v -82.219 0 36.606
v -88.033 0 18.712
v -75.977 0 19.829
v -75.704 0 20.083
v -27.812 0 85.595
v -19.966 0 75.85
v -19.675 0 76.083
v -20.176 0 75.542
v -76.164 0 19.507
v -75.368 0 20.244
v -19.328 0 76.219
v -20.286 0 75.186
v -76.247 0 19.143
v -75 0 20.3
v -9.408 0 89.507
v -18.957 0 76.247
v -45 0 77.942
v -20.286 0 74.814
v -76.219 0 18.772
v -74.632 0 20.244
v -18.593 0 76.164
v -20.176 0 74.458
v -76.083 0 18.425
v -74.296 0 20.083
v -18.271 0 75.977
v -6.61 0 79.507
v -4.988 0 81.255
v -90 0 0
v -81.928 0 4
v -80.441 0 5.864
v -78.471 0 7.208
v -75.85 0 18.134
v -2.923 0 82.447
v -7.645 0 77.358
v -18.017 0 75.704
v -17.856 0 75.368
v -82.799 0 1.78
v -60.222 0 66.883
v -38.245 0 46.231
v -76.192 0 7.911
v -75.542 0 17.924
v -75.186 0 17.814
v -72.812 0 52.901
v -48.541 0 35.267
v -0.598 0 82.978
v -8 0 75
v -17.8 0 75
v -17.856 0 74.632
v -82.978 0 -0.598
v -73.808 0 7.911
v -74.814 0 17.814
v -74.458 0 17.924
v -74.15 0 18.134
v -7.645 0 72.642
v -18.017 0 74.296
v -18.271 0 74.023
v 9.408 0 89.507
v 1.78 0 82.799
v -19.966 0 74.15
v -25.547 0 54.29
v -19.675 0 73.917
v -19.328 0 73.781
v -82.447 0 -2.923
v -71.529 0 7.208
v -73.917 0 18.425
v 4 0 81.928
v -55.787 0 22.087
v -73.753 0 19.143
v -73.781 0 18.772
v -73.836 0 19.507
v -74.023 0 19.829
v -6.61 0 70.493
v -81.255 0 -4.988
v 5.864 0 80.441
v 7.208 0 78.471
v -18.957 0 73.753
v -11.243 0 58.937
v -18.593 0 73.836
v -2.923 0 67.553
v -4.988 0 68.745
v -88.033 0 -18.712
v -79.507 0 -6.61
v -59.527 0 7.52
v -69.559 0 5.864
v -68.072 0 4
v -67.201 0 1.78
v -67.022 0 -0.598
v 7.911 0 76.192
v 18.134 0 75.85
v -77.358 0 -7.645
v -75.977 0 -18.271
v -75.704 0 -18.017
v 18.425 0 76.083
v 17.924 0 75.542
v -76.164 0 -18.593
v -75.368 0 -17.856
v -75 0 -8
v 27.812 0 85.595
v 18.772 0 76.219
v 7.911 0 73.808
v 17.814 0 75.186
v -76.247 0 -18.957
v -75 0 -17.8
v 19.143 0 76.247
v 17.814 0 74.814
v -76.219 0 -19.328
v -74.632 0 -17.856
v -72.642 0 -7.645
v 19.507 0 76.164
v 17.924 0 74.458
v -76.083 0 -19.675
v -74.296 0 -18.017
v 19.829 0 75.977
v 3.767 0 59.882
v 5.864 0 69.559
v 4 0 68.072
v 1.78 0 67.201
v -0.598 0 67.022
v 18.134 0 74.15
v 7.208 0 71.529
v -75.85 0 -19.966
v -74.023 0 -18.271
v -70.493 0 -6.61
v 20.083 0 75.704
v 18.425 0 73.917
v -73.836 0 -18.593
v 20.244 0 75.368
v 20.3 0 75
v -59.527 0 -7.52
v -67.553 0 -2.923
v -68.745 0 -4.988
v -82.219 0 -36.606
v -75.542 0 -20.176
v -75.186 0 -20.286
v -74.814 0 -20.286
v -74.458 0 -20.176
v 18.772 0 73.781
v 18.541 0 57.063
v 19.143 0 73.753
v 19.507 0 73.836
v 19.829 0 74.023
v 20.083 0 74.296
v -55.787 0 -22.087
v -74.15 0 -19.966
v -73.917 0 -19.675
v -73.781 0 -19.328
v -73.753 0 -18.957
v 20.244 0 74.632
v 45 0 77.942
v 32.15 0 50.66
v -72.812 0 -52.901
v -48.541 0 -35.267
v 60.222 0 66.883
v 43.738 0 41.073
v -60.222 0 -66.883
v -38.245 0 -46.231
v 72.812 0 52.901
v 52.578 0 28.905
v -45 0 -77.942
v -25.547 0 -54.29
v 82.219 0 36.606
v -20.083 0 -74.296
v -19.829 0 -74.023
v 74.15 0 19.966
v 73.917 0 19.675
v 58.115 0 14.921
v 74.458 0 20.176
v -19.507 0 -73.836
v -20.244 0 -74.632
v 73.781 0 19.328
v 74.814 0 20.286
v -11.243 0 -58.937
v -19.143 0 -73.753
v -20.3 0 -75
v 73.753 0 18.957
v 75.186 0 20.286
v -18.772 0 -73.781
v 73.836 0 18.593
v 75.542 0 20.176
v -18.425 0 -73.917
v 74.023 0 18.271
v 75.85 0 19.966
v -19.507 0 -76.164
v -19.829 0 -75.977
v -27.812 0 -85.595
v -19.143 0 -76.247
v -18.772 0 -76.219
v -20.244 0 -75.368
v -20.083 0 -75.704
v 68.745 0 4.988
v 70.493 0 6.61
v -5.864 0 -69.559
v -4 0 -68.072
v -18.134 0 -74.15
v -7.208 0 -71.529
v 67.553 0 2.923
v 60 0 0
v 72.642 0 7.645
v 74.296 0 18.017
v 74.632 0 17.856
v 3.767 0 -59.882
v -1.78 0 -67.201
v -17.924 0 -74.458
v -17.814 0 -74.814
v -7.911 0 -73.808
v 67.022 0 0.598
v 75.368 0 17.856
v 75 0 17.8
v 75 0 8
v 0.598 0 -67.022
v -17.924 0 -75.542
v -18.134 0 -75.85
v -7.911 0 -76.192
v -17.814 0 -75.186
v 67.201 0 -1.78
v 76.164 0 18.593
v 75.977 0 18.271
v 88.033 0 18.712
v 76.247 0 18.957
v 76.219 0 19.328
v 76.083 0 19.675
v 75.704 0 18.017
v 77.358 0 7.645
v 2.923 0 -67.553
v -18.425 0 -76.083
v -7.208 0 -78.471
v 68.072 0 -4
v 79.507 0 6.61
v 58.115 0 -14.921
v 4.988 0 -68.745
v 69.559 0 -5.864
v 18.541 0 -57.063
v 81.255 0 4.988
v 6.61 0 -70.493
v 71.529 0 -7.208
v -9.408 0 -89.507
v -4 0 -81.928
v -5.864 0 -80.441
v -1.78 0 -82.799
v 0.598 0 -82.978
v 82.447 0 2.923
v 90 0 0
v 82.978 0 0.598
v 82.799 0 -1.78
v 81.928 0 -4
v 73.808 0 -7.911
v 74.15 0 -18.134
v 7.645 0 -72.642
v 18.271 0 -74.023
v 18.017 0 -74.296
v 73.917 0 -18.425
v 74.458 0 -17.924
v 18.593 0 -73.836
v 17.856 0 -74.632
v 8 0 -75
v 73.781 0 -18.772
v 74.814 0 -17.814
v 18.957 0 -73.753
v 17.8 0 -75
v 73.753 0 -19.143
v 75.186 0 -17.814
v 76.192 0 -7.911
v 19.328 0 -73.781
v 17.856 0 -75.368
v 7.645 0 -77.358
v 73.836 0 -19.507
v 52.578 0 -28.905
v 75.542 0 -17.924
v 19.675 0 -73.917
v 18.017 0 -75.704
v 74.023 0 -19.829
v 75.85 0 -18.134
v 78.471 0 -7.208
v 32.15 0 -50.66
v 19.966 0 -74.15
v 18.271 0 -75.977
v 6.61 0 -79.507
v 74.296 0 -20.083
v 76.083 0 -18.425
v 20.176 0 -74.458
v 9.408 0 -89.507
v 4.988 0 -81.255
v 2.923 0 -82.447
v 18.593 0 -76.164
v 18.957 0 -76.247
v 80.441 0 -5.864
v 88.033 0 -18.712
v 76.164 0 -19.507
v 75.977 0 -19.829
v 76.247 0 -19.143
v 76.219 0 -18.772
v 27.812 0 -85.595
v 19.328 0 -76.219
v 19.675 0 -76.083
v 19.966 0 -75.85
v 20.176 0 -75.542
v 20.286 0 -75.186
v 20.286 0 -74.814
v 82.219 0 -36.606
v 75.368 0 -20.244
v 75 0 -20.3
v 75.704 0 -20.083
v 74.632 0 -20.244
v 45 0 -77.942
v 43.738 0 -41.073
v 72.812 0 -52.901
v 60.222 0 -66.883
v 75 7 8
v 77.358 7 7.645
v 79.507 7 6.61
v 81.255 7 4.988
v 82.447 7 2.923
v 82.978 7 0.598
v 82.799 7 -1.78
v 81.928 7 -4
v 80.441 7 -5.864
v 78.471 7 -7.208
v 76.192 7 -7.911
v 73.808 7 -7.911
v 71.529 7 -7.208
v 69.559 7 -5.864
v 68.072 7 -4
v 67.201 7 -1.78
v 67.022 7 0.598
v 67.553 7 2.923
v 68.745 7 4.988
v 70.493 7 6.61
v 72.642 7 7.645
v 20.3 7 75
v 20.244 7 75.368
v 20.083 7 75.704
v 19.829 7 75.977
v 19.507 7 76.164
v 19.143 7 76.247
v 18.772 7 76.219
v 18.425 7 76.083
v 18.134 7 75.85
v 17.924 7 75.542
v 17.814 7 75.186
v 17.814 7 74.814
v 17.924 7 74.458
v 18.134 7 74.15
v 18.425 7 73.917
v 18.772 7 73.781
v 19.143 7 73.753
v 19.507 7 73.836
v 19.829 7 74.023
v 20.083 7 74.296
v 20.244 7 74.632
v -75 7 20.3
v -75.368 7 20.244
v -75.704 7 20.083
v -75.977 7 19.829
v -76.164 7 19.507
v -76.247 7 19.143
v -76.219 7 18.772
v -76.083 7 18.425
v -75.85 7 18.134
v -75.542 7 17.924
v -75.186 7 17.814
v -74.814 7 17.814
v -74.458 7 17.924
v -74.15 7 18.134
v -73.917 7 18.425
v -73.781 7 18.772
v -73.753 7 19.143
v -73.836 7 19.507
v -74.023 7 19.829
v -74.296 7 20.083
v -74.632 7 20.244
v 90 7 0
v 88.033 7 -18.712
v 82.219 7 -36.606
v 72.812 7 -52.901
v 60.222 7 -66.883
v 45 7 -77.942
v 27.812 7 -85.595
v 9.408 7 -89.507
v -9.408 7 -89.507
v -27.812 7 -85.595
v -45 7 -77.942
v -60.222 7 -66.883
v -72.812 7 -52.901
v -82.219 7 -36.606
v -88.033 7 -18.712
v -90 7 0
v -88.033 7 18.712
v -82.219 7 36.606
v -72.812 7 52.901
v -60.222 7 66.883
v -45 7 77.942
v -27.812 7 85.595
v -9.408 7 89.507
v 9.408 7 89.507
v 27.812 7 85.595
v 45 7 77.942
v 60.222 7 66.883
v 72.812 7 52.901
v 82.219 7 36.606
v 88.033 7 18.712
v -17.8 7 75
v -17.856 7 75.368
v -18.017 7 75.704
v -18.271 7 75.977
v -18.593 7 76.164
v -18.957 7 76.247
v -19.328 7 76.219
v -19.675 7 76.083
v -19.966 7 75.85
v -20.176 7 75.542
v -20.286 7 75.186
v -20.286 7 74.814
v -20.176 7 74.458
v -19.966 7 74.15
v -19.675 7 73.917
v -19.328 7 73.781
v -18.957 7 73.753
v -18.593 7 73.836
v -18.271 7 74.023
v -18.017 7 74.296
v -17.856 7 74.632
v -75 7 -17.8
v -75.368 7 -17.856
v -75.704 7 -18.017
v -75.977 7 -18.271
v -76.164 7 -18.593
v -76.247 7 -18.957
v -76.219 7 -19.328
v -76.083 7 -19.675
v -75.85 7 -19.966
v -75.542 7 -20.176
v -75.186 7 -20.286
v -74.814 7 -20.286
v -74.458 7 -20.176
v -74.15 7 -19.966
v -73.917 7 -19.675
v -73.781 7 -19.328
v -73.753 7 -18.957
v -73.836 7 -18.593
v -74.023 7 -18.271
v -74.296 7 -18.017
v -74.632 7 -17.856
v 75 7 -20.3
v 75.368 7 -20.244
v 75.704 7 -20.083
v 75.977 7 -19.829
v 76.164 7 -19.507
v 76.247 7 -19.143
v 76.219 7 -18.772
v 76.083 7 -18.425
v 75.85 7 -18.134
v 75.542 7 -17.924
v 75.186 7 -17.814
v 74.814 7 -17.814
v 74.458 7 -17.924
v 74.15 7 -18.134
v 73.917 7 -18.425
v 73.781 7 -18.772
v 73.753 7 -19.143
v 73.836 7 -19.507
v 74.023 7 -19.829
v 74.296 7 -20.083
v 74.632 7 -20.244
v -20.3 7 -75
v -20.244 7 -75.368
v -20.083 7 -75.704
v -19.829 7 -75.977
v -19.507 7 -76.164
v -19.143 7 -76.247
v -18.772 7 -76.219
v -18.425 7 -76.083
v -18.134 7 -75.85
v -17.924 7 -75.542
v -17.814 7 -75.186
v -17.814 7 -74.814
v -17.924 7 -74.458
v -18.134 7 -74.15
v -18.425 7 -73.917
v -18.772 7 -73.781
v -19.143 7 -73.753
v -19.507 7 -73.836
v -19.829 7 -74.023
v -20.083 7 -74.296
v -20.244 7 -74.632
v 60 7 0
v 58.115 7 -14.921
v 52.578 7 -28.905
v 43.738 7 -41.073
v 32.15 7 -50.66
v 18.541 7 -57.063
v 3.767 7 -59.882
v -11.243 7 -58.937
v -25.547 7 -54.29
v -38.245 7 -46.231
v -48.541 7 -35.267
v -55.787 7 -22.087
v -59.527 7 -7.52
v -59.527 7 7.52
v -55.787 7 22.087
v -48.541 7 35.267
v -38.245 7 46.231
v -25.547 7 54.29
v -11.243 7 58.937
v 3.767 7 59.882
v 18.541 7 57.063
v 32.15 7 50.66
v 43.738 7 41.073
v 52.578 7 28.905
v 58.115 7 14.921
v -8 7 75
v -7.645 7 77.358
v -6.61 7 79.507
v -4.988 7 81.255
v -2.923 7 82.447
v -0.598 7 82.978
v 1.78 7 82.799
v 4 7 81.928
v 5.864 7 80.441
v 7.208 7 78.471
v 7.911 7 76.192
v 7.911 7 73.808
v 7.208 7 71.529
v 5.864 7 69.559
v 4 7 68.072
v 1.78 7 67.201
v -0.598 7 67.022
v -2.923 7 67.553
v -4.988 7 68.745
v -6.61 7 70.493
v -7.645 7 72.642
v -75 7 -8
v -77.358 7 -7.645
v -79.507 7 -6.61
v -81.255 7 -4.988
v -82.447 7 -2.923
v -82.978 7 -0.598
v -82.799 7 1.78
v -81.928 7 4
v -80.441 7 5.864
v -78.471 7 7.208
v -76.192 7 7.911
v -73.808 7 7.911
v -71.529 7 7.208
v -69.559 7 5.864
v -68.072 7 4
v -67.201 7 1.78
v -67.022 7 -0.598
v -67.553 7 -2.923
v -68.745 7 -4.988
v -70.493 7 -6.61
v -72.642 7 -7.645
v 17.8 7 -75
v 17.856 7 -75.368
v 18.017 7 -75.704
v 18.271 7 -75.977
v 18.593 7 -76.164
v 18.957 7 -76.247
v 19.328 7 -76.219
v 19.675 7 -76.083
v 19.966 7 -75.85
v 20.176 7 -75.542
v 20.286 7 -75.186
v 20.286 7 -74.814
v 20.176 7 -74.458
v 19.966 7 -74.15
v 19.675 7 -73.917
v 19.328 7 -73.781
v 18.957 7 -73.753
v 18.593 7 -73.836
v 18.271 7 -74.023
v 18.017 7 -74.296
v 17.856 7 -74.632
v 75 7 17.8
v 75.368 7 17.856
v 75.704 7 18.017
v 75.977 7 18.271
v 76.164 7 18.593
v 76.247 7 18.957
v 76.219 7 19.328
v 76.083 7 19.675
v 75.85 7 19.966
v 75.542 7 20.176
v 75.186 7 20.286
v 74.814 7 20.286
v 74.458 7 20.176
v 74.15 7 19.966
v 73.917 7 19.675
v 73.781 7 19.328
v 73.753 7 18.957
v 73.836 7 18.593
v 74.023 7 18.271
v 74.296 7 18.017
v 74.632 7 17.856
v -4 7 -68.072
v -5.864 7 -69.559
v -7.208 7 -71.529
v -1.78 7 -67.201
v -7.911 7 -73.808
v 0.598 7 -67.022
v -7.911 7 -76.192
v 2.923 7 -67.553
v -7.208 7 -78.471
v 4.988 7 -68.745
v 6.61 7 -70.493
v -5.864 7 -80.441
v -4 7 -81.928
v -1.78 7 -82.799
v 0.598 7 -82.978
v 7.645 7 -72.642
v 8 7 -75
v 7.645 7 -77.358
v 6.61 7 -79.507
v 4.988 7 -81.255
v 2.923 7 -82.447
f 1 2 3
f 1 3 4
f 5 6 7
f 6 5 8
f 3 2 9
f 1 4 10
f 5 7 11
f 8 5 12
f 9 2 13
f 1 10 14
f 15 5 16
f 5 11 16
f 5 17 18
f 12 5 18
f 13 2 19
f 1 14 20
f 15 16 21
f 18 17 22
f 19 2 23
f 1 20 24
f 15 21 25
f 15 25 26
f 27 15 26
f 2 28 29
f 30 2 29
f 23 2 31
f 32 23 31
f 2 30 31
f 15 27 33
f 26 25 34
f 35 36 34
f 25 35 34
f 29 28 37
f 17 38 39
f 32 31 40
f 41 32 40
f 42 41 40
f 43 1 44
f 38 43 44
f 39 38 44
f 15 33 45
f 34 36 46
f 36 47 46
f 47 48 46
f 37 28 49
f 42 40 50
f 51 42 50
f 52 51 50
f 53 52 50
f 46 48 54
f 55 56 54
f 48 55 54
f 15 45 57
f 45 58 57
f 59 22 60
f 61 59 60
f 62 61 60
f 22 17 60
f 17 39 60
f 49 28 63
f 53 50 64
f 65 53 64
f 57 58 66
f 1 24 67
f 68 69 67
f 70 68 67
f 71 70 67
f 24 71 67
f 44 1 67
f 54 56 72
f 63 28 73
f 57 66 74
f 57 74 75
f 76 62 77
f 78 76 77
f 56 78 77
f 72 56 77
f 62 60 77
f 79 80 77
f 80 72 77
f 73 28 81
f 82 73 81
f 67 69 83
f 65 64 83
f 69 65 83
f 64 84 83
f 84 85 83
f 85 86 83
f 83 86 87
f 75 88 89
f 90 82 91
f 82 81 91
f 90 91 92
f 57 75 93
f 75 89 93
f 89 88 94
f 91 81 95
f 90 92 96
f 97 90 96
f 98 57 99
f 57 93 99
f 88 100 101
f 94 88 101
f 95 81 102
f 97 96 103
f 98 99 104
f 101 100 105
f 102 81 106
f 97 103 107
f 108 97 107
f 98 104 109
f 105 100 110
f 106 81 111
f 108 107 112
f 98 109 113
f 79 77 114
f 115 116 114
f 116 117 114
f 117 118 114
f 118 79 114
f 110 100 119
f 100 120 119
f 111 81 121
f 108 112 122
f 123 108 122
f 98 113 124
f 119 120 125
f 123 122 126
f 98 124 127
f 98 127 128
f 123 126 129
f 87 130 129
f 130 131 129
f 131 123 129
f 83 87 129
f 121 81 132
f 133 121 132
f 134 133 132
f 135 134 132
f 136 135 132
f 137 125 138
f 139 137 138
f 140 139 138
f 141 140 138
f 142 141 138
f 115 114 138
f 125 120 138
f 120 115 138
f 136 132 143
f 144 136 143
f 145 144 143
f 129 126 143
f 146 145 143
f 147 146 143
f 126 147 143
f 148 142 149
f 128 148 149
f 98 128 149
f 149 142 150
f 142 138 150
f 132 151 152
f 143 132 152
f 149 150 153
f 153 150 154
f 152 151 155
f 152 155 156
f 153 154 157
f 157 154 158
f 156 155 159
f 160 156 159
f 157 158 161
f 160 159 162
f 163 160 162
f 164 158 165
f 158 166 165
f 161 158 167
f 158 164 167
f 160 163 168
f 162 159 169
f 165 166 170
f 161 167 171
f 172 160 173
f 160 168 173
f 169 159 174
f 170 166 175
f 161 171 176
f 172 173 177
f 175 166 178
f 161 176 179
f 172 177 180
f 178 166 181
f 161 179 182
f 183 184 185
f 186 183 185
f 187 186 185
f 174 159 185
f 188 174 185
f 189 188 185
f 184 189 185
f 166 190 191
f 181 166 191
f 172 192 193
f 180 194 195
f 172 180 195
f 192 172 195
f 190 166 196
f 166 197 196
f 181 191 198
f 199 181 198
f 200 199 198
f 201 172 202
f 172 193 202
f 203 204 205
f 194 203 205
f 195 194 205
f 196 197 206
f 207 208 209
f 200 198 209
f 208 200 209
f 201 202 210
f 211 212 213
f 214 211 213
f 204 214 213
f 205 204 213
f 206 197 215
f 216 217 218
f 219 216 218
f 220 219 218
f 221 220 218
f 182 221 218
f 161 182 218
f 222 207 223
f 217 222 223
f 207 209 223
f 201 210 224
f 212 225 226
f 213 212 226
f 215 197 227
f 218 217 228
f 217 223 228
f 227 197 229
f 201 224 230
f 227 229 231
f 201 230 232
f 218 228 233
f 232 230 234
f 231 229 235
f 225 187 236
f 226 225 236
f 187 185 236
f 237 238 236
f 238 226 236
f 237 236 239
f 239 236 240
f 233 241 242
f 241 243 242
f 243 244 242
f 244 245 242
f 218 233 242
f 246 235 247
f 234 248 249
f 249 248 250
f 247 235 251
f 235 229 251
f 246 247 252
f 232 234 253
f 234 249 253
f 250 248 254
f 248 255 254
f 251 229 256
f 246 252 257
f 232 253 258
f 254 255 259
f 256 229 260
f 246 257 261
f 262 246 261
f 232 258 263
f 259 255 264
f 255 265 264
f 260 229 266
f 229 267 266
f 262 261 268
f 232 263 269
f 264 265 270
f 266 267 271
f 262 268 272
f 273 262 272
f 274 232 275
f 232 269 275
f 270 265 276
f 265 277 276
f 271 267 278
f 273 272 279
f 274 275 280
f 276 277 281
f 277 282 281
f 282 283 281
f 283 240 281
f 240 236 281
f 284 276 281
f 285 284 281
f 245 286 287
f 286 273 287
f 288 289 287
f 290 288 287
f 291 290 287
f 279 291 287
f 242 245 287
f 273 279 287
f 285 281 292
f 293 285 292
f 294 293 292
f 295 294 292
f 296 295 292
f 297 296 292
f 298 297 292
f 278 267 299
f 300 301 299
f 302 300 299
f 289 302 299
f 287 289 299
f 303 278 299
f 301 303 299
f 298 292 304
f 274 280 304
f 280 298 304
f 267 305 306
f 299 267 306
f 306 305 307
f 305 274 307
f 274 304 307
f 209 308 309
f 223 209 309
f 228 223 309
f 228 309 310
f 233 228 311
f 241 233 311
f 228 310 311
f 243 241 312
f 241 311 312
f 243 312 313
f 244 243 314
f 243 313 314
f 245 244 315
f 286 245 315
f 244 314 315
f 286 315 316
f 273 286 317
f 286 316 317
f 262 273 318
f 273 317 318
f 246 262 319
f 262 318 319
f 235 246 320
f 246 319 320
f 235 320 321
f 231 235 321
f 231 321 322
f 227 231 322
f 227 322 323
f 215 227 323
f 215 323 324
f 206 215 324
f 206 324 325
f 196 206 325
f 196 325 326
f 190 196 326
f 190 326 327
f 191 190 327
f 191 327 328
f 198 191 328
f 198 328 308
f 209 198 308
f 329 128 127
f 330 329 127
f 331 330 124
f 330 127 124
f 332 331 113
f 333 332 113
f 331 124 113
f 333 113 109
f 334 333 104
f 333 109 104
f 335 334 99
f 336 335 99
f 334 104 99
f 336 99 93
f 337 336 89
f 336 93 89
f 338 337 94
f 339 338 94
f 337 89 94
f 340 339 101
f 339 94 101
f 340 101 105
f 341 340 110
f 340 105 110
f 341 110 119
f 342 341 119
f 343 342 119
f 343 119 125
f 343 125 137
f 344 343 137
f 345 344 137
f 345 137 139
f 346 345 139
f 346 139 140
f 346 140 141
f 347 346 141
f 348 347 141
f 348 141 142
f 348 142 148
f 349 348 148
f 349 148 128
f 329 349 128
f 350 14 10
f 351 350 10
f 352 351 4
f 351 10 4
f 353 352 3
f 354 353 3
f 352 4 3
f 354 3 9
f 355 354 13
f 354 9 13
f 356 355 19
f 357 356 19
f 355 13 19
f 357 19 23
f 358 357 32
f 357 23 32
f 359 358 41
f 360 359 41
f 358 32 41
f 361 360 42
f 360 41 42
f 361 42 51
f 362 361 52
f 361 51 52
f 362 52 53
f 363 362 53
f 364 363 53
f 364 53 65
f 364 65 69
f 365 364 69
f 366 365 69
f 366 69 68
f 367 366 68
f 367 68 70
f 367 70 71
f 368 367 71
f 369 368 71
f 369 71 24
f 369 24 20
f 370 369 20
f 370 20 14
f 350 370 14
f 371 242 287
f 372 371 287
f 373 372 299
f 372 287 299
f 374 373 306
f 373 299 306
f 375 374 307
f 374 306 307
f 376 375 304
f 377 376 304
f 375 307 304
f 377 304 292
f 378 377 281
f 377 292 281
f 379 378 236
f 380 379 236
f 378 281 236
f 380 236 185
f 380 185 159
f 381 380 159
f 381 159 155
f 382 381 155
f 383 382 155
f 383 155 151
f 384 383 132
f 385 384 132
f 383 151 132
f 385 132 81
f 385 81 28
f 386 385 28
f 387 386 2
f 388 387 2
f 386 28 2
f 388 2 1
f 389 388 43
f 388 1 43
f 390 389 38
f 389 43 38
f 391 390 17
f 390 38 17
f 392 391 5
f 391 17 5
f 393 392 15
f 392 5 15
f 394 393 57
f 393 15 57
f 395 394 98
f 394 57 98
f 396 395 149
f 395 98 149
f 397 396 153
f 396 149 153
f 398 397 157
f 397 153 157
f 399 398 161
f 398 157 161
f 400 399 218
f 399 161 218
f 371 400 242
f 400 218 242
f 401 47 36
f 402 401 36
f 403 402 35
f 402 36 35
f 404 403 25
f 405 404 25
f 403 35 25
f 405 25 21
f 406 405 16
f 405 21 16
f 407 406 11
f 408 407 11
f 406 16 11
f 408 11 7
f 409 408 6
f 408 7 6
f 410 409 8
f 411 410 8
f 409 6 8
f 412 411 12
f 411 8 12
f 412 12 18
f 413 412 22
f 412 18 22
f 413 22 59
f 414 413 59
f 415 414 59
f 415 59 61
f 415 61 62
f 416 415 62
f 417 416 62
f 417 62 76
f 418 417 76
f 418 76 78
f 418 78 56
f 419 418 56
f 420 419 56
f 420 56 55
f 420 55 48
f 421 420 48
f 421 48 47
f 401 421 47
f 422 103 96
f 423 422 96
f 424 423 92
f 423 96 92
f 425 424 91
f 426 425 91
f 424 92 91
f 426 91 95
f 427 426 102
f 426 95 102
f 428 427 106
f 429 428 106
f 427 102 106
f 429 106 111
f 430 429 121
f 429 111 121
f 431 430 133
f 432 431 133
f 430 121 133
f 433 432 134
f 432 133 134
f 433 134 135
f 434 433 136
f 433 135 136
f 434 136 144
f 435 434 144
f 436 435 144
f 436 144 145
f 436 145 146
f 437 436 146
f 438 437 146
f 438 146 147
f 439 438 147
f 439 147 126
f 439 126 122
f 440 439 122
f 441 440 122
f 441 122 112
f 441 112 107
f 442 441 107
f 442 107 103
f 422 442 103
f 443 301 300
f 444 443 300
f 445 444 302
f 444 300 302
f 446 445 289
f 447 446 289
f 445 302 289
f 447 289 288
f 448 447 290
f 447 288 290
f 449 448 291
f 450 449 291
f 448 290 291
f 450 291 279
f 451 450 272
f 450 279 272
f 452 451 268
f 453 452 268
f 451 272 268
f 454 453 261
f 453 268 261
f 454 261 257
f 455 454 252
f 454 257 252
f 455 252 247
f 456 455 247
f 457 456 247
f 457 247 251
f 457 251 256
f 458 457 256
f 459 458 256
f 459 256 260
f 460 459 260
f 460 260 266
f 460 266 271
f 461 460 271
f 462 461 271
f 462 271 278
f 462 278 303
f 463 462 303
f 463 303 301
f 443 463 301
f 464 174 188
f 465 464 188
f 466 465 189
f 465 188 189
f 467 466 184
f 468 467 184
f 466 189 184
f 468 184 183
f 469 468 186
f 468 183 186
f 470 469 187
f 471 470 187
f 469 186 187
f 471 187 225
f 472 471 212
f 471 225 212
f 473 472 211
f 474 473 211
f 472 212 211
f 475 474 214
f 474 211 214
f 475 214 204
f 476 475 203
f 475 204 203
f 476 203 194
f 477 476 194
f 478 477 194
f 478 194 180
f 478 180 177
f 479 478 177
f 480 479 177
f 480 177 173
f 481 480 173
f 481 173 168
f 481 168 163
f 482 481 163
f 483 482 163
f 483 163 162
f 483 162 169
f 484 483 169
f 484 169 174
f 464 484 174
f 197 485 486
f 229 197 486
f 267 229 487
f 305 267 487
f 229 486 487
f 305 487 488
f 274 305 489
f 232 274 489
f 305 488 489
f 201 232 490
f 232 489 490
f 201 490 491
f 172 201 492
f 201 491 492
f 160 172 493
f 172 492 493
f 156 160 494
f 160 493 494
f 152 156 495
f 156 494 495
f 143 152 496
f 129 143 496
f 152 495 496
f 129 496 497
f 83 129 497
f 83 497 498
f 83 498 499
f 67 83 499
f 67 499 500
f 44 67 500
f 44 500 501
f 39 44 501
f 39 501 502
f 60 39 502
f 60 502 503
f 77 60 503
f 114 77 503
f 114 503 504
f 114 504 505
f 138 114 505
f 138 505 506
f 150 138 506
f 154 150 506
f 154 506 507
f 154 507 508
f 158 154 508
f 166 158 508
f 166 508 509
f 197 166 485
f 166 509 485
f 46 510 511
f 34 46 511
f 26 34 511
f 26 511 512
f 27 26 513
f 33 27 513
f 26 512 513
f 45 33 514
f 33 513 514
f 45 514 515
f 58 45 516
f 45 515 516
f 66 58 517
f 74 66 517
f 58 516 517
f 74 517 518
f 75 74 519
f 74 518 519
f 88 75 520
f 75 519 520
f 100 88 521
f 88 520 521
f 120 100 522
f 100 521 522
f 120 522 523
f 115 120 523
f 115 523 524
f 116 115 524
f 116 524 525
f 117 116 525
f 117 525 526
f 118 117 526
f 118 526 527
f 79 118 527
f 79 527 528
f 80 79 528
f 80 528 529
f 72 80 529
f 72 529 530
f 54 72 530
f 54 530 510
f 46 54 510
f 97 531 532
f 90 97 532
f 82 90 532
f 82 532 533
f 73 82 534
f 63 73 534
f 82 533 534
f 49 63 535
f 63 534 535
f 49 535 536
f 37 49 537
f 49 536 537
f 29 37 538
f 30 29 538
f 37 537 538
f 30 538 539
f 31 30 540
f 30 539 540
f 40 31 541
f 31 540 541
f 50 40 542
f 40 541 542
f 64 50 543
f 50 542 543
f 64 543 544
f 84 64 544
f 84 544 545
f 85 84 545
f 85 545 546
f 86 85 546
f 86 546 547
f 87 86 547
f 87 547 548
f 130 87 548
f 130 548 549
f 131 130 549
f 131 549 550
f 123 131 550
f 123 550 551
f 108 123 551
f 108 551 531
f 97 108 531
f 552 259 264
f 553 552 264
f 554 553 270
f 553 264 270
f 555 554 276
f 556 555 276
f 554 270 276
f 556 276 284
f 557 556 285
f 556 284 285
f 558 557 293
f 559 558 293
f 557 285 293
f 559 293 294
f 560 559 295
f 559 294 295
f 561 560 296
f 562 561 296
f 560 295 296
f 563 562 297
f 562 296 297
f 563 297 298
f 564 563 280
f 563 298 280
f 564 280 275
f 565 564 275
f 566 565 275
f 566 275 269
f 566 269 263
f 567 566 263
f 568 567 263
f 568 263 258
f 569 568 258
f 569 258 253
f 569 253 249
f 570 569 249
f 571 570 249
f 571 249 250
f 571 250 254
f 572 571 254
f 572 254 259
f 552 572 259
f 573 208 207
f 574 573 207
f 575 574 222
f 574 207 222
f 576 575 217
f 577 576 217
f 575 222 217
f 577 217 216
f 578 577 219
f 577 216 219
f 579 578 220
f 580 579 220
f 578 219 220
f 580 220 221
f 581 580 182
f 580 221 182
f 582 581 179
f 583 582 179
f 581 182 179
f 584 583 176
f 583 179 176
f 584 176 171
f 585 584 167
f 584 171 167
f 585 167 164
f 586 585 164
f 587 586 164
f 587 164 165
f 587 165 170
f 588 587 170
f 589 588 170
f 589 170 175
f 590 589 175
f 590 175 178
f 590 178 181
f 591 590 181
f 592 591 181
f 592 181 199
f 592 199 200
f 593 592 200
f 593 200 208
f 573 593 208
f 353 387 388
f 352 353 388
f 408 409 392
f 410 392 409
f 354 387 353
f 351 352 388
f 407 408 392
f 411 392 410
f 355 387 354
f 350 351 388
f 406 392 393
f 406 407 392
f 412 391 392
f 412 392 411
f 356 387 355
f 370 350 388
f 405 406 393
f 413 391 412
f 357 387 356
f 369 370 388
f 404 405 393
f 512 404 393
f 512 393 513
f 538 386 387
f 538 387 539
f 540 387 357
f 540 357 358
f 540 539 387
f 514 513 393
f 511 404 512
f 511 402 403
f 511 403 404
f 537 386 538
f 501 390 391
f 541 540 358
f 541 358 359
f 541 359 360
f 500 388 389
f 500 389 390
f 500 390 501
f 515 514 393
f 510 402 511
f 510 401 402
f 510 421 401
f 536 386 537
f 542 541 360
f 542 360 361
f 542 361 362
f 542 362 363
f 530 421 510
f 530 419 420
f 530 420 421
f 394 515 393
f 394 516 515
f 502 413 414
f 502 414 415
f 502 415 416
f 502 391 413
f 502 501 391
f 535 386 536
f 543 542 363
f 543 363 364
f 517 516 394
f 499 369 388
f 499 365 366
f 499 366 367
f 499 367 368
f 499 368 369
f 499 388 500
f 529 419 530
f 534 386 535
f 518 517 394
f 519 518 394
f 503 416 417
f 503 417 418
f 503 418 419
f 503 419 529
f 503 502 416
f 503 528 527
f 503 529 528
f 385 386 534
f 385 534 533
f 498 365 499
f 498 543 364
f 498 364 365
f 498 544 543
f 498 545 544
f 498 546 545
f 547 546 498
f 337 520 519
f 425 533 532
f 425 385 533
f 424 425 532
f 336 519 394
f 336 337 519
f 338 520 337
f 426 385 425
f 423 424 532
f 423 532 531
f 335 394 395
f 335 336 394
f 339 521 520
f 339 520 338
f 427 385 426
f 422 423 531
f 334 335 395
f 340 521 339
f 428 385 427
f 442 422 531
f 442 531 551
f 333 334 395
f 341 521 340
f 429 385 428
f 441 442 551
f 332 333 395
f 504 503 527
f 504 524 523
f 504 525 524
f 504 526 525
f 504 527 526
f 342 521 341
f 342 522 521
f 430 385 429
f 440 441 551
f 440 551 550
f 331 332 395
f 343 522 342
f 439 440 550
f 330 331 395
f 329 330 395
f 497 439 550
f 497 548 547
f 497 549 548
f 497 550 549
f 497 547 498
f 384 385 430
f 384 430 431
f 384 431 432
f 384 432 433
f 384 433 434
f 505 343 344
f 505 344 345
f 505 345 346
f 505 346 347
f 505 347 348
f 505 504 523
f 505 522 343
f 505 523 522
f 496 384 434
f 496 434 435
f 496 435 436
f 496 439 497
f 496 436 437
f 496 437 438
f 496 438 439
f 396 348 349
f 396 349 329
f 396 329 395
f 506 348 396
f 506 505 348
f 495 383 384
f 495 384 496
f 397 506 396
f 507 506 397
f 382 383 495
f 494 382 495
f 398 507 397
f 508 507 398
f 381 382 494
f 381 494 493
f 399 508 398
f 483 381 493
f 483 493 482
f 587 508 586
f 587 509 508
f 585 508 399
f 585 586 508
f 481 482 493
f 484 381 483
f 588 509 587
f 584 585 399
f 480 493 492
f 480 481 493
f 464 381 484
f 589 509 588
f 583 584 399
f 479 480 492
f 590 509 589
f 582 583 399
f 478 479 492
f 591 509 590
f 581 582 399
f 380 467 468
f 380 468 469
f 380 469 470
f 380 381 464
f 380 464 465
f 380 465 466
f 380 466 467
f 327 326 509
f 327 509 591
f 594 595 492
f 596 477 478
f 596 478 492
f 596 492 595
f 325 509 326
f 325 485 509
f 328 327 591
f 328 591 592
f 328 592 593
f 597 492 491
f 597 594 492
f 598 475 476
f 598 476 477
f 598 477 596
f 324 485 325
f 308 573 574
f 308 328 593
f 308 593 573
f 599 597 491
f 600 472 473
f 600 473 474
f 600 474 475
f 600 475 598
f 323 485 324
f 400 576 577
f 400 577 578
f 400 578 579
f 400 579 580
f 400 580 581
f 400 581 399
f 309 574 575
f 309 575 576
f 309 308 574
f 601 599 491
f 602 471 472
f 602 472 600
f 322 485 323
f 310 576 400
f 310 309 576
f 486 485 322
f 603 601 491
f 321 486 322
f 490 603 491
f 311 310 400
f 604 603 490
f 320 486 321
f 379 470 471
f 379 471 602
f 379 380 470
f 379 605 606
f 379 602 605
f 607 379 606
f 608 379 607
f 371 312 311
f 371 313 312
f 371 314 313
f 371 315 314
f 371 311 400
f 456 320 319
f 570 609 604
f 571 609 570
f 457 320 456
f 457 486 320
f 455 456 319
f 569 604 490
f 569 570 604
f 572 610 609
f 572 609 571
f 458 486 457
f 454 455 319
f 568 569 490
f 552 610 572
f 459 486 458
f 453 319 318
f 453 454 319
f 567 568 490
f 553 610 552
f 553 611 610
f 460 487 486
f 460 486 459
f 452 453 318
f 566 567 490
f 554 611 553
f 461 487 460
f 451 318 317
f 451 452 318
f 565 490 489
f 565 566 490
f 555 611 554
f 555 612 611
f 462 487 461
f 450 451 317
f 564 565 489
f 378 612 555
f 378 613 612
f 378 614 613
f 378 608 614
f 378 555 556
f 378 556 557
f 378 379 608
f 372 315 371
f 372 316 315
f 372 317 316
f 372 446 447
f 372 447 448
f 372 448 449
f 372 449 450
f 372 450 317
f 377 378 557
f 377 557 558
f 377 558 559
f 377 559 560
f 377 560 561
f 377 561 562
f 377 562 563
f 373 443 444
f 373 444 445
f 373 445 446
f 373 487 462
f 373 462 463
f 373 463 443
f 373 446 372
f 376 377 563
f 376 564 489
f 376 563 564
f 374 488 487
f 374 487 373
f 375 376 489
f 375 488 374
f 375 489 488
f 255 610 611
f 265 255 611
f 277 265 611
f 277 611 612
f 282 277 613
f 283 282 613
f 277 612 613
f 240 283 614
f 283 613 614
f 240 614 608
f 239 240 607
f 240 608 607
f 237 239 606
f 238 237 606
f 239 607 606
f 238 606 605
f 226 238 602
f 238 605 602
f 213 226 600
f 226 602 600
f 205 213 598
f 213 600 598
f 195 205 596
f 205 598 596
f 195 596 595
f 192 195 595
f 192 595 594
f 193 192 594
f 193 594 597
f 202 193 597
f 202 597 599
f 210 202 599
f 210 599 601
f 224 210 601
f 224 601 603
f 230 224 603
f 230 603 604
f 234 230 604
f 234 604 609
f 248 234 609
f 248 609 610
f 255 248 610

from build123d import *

# Parameters (mm, degrees)
SKETCH2_R             = 90
EXTRUDE1_DEPTH        = 7
SKETCH3_R             = 8
CUT_EXTRUDE1_DEPTH    = 8
M3X0_5_TAPPED_HOLE1_D = 2.5
CIRPATTERN1_COUNT     = 4
SKETCH8_R             = 60
CUT_EXTRUDE2_DEPTH    = 8


with BuildPart() as part:
    # Sketch2 → Extrude1 (new body)
    with BuildSketch(Plane(origin=(0, 0, 0), x_dir=(1, 0, 0), z_dir=(0, 1, 0))):
        Circle(SKETCH2_R)
    extrude(amount=EXTRUDE1_DEPTH)

    # Sketch3 → Cut-Extrude1 (cut, through all)
    with BuildSketch(Plane(origin=(0, 7, 0), x_dir=(1, 0, 0), z_dir=(0, 1, 0))):
        with Locations((0, 75)):
            Circle(SKETCH3_R)
    cut_extrude1 = extrude(amount=-CUT_EXTRUDE1_DEPTH, mode=Mode.SUBTRACT)

    # M3x0.5 Tapped Hole1 (through all)
    with Locations(Plane(origin=(0, 7, 0), x_dir=(1, 0, 0), z_dir=(0, 1, 0))):
        with Locations((-19.05, 75), (19.05, 75)):
            m3x0_5_tapped_hole1 = Hole(M3X0_5_TAPPED_HOLE1_D / 2)

    # CirPattern1: Cut-Extrude1, M3x0.5 Tapped Hole1 ×4 about axis
    cirpattern1_axis = Axis((0, 0, 0), (0, 1, 0))
    for i in range(1, CIRPATTERN1_COUNT):
        add(cut_extrude1.rotate(cirpattern1_axis, i * 360 / CIRPATTERN1_COUNT), mode=Mode.SUBTRACT)
        add(m3x0_5_tapped_hole1.rotate(cirpattern1_axis, i * 360 / CIRPATTERN1_COUNT), mode=Mode.SUBTRACT)

    # Sketch8 → Cut-Extrude2 (cut, through all)
    with BuildSketch(Plane(origin=(0, 7, 0), x_dir=(1, 0, 0), z_dir=(0, 1, 0))):
        Circle(SKETCH8_R)
    extrude(amount=-CUT_EXTRUDE2_DEPTH, mode=Mode.SUBTRACT)


solid = part.part
